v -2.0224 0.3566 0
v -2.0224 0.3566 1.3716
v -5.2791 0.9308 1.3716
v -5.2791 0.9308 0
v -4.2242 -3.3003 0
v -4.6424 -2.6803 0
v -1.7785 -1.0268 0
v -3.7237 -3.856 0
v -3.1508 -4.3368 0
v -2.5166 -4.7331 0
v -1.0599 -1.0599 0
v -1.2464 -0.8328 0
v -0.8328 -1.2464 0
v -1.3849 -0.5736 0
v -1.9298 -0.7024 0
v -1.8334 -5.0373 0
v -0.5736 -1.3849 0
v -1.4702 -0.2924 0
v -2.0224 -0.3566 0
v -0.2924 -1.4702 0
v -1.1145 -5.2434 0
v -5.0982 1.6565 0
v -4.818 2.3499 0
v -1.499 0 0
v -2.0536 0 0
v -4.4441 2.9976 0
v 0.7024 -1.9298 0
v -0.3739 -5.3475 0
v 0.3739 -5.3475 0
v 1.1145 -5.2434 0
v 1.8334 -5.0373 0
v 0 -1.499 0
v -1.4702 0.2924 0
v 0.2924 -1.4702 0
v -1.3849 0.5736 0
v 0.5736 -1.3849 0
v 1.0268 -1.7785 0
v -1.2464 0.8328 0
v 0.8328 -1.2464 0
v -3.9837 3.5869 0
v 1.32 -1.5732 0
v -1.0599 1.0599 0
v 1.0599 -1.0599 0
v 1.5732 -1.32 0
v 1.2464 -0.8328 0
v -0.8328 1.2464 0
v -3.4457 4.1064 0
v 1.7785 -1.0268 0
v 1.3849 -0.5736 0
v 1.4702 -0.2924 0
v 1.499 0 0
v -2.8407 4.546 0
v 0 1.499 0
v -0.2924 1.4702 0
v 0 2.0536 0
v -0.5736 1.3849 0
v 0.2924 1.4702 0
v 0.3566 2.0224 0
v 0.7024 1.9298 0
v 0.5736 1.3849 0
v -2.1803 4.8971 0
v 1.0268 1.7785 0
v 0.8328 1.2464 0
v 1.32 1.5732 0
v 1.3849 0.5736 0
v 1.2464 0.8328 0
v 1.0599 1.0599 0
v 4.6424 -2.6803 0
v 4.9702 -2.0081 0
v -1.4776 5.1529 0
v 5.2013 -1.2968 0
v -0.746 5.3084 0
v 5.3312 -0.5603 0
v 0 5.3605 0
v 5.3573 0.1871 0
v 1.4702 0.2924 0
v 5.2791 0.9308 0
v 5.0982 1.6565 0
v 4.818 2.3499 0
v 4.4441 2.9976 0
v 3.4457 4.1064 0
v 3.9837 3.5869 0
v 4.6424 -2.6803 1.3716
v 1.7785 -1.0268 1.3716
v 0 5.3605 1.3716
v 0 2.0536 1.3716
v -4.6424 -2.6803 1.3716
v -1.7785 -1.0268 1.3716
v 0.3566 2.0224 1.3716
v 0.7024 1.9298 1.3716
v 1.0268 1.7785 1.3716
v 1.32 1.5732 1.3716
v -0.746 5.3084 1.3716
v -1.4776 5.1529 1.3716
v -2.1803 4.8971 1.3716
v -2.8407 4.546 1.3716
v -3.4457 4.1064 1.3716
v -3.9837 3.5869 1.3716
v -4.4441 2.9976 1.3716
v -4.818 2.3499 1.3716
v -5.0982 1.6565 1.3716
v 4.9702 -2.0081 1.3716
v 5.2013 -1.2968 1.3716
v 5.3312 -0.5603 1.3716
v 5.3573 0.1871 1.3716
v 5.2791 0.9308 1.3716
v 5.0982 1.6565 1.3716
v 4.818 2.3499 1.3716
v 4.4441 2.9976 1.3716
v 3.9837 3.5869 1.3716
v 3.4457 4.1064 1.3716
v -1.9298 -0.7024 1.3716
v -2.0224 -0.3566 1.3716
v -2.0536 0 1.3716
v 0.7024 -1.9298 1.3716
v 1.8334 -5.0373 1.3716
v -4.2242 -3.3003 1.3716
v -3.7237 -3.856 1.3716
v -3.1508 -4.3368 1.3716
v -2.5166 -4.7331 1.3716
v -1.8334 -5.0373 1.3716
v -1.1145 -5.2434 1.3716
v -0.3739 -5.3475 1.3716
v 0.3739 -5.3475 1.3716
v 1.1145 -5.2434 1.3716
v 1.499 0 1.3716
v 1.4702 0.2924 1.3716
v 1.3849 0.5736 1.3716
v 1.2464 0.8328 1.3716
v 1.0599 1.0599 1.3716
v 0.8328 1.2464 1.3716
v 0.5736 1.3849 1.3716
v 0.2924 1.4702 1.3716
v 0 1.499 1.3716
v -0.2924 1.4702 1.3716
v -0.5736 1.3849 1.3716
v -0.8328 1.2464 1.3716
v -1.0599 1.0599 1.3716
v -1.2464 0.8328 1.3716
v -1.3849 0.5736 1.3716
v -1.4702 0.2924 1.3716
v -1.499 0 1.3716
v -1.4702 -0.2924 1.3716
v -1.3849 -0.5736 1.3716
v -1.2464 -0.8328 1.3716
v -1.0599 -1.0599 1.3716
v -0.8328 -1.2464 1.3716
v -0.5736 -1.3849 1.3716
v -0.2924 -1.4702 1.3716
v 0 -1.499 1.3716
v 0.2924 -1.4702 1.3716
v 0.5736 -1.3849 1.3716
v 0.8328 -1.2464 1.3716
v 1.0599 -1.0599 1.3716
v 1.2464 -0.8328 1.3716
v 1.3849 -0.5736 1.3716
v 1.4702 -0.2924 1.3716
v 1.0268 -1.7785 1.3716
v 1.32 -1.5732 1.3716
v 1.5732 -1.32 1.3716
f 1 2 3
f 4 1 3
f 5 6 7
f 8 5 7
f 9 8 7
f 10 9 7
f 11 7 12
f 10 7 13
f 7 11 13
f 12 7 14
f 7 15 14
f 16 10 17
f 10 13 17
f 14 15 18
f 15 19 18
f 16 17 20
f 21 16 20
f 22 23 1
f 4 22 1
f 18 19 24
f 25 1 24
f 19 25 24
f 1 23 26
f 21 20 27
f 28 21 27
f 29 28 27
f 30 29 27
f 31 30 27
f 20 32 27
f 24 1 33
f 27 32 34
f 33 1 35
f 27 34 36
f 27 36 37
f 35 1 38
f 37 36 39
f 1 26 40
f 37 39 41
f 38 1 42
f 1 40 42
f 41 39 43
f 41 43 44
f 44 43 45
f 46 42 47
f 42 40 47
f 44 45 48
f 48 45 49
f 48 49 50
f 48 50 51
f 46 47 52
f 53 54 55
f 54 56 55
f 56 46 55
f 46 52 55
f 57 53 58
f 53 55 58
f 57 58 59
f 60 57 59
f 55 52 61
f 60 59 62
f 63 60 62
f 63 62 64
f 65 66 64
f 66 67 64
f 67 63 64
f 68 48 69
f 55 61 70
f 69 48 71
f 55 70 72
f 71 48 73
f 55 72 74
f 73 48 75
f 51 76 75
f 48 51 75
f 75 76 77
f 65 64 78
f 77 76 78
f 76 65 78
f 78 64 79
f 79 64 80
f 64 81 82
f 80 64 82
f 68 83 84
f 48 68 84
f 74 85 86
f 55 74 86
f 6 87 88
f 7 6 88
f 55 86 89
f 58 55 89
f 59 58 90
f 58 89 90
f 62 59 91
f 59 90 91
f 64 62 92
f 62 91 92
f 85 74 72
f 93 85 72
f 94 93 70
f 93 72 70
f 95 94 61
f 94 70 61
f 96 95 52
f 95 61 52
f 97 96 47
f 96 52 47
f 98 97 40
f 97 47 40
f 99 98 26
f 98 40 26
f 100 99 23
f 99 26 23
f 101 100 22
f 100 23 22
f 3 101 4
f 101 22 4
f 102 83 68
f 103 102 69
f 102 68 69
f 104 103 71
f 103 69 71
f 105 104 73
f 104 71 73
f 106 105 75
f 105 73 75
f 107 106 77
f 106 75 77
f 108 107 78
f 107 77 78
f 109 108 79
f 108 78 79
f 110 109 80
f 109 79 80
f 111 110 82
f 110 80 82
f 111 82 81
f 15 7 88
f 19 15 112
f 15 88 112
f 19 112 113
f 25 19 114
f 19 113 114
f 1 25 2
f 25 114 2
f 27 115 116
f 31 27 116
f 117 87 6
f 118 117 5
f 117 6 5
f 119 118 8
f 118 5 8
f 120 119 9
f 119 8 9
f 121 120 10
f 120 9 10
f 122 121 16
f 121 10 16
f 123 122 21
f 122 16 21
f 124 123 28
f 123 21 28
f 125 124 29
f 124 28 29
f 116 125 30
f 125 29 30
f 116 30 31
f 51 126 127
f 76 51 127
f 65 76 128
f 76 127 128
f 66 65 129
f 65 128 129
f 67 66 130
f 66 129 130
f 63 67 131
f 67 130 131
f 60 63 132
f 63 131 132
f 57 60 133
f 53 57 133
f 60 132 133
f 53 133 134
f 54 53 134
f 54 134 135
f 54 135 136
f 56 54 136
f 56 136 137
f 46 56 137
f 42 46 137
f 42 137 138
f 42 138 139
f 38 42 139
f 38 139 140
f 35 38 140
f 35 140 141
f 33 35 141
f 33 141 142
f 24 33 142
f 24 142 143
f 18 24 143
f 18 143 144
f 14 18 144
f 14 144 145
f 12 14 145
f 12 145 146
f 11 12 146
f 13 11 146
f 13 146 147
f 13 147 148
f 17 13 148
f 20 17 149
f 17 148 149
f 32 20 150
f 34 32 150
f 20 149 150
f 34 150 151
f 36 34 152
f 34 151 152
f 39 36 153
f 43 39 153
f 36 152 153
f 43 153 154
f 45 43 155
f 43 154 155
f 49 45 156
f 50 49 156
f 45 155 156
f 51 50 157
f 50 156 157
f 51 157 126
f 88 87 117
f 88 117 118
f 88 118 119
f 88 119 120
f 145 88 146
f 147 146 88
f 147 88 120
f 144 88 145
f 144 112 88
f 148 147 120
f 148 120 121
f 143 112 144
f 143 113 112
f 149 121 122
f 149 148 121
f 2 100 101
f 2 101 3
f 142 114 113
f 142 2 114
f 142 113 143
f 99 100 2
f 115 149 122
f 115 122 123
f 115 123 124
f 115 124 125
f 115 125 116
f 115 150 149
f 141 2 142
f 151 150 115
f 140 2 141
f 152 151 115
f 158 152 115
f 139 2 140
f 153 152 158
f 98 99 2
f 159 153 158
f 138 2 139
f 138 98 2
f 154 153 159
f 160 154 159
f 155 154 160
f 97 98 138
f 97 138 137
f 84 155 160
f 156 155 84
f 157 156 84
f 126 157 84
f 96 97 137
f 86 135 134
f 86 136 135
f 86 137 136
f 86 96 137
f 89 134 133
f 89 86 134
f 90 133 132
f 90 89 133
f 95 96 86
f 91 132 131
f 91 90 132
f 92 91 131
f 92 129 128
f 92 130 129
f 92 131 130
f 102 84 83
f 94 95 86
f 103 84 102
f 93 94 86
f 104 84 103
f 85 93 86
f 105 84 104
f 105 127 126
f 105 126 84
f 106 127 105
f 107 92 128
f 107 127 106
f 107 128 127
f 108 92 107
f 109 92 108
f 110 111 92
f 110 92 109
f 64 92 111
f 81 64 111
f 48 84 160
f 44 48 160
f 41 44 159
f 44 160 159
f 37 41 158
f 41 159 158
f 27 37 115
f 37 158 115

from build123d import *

# Parameters (mm, degrees)
F0_R      = 28.3757796524
F1_DEPTH  = 8.636
F2_R      = 3.772916628
F3_DEPTH  = 25.4
F5_R      = 5.3605373526
F6_DEPTH  = 1.3716
F7_R      = 1.4989937
F8_DEPTH  = 25.4
F10_DEPTH = 25.4


with BuildPart() as f1:
    # F0 (on Top) → F1 (new body)
    with BuildSketch(Plane.XY):
        with Locations((-28.4617077559, 15.6847797334)):
            Circle(F0_R)
    extrude(amount=F1_DEPTH)

    # F2 (on face) → F3 (cut)
    with BuildSketch(Plane.XY.offset(8.636)):
        with Locations((-28.4617077559, 15.6847797334)):
            Circle(F2_R)
    extrude(amount=-F3_DEPTH, mode=Mode.SUBTRACT)


with BuildPart() as f6:
    # F5 (on Top) → F6 (new body)
    with BuildSketch(Plane.XY):
        Circle(F5_R)
    extrude(amount=F6_DEPTH)

    # F7 (on face) → F8 (cut)
    with BuildSketch(Plane.XY.offset(1.3716)):
        Circle(F7_R)
    extrude(amount=-F8_DEPTH, mode=Mode.SUBTRACT)

    # F9 (on face) → F10 (cut)
    with BuildSketch(Plane.XY.offset(1.3716)):
        with BuildLine():
            Line((4.6423615252, -2.6802686763), (1.7784824816, -1.0268073395))
            ThreePointArc((1.7784824816, -1.0268073395), (1.3200380707, -1.5731601132), (0.7023775868, -1.9297665598))
            Line((0.7023775868, -1.9297665598), (1.8334117536, -5.0372573936))
            ThreePointArc((1.8334117536, -5.0372573936), (3.4456869915, -4.1064098511), (4.6423615252, -2.6802686763))
        make_face()
        with BuildLine():
            Line((-4.6423615252, -2.6802686763), (-1.7784824816, -1.0268073395))
            ThreePointArc((-1.7784824816, -1.0268073395), (-2.0224156576, -0.3566064466), (-2.0224156576, 0.3566064466))
            Line((-2.0224156576, 0.3566064466), (-5.2790987451, 0.9308475426))
            ThreePointArc((-5.2790987451, 0.9308475426), (-5.2790987451, -0.9308475426), (-4.6423615252, -2.6802686763))
        make_face()
        with BuildLine():
            ThreePointArc((0, 2.053614679), (0.7023775868, 1.9297665598), (1.3200380707, 1.5731601132))
            Line((1.3200380707, 1.5731601132), (3.4456869915, 4.1064098511))
            ThreePointArc((3.4456869915, 4.1064098511), (1.8334117536, 5.0372573936), (0, 5.3605373526))
            Line((0, 5.3605373526), (0, 2.053614679))
        make_face()
    extrude(amount=-F10_DEPTH, mode=Mode.SUBTRACT)


solid = f6.part
